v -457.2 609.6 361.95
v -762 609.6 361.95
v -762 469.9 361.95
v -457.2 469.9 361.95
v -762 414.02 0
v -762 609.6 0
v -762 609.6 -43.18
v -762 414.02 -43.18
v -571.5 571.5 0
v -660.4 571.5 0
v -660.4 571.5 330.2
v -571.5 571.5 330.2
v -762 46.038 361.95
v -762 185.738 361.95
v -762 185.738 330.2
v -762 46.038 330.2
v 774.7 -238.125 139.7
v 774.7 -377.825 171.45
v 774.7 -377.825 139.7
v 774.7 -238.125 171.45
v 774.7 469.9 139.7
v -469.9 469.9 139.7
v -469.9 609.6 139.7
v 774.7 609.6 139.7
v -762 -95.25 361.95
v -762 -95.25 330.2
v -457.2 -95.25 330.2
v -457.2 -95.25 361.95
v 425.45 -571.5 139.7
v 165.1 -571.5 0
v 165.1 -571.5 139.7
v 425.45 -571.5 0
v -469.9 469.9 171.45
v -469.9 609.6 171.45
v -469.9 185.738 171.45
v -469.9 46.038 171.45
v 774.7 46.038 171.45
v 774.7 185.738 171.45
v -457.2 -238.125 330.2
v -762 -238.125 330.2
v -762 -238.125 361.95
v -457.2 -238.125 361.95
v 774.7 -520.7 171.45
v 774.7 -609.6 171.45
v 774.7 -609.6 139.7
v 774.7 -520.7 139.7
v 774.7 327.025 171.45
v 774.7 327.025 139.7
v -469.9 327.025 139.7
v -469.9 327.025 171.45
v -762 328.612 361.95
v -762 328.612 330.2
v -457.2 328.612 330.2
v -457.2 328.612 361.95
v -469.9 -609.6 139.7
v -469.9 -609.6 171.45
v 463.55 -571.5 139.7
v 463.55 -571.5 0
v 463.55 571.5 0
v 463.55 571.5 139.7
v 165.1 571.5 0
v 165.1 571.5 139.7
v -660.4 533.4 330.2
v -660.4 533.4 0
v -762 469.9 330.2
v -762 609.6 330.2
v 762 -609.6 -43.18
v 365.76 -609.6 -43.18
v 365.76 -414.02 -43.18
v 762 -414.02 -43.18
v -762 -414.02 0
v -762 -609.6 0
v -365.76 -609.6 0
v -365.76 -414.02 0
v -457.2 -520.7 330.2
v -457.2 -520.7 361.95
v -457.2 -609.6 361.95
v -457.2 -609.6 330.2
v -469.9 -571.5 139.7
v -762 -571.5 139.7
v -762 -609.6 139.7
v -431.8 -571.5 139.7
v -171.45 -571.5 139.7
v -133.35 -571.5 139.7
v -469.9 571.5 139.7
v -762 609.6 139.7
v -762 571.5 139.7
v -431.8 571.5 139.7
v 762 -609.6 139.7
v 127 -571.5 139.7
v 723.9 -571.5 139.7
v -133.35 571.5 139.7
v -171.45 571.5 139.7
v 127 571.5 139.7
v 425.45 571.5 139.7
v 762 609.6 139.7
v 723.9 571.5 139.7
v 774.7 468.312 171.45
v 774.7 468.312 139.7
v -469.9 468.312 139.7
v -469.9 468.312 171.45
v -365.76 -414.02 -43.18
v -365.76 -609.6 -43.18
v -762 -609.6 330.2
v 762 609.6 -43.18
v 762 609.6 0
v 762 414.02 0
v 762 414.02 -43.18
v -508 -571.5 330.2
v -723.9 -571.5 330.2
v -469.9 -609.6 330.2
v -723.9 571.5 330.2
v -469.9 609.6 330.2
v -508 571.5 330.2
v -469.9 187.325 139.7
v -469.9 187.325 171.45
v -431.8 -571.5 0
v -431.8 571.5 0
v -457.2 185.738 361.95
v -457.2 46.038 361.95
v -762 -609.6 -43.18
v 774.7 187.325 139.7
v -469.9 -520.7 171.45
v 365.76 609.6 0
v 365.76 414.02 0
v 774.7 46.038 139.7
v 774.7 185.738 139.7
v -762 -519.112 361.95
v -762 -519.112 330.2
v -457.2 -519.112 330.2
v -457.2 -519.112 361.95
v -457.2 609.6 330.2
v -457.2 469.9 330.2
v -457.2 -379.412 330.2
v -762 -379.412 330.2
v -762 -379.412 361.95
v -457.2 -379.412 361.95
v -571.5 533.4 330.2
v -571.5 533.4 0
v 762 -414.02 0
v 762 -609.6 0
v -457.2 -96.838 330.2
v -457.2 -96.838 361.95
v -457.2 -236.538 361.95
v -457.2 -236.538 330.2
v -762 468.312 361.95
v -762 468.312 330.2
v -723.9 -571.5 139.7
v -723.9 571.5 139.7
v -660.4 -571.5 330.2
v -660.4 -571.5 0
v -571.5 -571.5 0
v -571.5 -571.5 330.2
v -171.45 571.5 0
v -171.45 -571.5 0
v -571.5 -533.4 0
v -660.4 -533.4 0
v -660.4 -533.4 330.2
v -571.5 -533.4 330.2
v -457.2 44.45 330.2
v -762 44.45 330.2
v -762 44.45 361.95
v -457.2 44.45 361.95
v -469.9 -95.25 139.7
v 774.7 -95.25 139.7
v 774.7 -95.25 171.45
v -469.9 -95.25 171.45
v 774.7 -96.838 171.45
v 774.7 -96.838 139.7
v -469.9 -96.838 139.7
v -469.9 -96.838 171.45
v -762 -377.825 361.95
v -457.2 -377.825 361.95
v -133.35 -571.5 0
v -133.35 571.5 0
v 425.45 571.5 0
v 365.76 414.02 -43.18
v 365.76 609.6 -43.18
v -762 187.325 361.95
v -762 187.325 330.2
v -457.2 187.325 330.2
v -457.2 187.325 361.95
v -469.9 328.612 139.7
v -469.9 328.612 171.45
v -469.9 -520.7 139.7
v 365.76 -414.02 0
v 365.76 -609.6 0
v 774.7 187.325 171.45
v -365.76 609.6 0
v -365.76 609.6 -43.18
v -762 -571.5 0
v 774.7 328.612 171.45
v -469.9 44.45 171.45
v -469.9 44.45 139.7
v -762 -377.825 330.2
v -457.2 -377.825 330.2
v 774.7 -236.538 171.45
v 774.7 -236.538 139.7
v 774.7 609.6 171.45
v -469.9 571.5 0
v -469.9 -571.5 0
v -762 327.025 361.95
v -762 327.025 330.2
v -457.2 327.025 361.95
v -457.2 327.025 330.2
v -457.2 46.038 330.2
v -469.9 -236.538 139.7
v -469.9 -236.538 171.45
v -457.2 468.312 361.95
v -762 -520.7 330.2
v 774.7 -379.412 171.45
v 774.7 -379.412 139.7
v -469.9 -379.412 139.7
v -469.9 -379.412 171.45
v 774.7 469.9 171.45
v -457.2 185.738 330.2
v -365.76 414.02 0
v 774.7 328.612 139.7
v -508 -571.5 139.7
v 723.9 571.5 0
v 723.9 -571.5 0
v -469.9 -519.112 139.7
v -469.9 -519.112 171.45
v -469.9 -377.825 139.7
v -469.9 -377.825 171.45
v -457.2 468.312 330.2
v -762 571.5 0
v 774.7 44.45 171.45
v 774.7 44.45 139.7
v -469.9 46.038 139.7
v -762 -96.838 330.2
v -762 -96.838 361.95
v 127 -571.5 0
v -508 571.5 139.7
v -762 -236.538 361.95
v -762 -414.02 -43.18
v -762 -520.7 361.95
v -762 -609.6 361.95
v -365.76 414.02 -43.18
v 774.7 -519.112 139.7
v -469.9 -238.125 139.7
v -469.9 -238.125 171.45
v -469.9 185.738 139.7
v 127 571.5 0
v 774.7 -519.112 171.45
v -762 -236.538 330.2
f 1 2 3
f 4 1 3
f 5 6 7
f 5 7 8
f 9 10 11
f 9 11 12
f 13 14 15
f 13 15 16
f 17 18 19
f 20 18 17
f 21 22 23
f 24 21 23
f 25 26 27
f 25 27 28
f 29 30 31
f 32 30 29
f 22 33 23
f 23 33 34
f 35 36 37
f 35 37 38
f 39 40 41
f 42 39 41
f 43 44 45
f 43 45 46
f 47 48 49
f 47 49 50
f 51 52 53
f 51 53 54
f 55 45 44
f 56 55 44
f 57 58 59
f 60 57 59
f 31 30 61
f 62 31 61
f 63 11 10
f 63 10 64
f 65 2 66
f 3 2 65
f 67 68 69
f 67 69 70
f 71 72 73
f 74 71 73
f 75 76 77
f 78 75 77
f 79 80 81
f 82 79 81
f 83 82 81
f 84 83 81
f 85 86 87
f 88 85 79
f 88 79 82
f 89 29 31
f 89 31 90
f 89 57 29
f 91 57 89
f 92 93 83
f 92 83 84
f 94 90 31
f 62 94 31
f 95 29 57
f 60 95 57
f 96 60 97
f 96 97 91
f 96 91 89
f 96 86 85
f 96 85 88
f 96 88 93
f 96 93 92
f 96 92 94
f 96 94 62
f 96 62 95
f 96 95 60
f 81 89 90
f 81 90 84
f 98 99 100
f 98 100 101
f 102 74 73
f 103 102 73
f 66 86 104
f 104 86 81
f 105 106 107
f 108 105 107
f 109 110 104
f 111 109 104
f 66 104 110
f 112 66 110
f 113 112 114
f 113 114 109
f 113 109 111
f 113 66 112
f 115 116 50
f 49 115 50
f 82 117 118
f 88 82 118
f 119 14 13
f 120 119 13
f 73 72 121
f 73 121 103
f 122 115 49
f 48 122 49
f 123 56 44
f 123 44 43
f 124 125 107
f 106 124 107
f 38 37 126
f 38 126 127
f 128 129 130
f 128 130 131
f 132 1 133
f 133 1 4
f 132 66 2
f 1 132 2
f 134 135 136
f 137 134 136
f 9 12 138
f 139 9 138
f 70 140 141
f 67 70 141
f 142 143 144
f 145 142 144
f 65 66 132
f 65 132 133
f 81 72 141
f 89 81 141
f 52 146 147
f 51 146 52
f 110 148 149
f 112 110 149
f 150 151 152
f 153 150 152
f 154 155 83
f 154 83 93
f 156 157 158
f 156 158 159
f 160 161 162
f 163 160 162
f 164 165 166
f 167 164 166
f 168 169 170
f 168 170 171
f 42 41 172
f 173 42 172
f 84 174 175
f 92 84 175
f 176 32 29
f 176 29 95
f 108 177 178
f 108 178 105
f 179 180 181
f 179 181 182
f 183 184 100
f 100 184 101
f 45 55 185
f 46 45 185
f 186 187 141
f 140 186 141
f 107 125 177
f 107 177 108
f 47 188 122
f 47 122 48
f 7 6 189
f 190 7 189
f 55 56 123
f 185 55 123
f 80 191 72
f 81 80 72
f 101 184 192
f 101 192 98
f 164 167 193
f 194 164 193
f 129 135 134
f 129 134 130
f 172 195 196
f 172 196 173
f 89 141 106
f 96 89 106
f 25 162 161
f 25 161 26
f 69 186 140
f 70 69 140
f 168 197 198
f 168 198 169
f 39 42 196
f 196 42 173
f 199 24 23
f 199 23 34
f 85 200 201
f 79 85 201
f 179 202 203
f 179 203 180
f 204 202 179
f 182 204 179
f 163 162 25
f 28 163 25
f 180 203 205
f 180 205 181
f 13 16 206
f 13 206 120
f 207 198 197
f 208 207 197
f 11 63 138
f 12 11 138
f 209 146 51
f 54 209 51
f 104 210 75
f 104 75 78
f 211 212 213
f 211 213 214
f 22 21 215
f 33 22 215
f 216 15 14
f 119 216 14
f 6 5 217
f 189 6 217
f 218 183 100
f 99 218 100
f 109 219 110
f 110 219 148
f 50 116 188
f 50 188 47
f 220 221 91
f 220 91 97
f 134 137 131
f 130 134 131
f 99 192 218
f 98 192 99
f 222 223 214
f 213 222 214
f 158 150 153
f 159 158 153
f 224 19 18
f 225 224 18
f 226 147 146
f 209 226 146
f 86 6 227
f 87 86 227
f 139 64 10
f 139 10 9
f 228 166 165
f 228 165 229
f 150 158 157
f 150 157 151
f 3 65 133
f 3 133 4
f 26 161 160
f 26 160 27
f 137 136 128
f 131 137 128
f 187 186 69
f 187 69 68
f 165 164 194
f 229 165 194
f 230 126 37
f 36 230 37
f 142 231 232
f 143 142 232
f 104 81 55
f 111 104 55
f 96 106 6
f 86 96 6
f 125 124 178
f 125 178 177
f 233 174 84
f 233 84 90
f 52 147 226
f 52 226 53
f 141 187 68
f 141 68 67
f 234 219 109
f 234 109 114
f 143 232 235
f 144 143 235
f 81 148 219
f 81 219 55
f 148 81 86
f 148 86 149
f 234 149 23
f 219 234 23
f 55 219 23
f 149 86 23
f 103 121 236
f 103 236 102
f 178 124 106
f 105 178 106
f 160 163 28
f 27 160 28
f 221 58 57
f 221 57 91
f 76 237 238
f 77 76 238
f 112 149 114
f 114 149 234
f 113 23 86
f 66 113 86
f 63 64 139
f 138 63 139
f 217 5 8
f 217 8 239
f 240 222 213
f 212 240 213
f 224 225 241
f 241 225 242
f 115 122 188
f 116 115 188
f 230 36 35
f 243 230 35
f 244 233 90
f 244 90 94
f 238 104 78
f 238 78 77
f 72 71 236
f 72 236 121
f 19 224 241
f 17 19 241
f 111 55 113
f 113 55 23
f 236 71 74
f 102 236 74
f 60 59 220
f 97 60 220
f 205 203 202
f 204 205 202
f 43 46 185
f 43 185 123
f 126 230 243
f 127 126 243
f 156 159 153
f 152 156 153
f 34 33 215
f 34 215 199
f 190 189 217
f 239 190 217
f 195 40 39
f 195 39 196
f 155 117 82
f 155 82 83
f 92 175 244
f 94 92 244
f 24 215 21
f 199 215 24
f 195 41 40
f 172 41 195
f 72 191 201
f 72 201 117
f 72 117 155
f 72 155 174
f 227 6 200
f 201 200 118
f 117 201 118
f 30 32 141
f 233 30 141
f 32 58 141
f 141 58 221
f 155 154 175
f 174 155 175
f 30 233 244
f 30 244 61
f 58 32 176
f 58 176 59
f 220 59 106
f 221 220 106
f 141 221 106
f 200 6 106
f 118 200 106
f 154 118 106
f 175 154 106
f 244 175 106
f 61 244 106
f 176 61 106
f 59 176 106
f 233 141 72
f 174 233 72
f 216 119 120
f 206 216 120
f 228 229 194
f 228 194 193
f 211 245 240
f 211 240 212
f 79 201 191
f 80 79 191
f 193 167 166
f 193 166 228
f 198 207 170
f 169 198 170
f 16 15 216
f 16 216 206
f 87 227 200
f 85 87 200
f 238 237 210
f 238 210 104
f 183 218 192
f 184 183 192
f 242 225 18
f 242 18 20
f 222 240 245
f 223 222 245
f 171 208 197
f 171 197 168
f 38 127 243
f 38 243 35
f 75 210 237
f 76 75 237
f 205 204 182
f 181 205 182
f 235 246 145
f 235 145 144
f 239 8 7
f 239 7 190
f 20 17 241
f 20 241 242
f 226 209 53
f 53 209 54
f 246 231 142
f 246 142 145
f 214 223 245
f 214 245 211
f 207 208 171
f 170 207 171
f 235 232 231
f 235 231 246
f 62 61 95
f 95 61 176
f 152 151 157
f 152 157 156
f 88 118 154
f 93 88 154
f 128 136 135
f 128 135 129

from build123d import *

# Parameters (mm, degrees)
F0_W      = 260.35
F0_H      = 1143
F1_DEPTH  = 139.7
F2_W      = 38.1
F2_H      = 1143
F3_DEPTH  = 190.5
F4_W      = 139.7
F4_H      = 31.75
F5_DEPTH  = 304.8
F4_W_2    = 88.9
F6_W      = 88.9
F6_H      = 31.75
F7_DEPTH  = 1244.6
F6_W_2    = 139.7
F8_W      = 88.9
F8_H      = 38.1
F9_DEPTH  = 330.2
F10_W     = 396.24
F10_H     = 195.58
F11_DEPTH = 43.18


with BuildPart() as f1:
    # F0 (on Top) → F1 (new body)
    with BuildSketch(Plane.XY):
        Polygon((762, 609.6), (-762, 609.6), (-762, 571.5), (-469.9, 571.5), (-469.9, -571.5), (-762, -571.5), (-762, -609.6), (762, -609.6), align=None)
        with Locations((-301.625, 0)):
            Rectangle(F0_W, F0_H, mode=Mode.SUBTRACT)
        with Locations((-3.175, 0)):
            Rectangle(F0_W, F0_H, mode=Mode.SUBTRACT)
        with Locations((295.275, 0)):
            Rectangle(F0_W, F0_H, mode=Mode.SUBTRACT)
        with Locations((593.725, 0)):
            Rectangle(F0_W, F0_H, mode=Mode.SUBTRACT)
    extrude(amount=F1_DEPTH)


with BuildPart() as f3:
    # F2 (on face) → F3 (new body)
    with BuildSketch(Plane.XY.offset(139.7)):
        Polygon((-762, -571.5), (-762, -609.6), (-469.9, -609.6), (-469.9, -571.5), (-508, -571.5), (-723.9, -571.5), align=None)
        with Locations((-488.95, 0)):
            Rectangle(F2_W, F2_H)
        Polygon((-762, 609.6), (-762, 571.5), (-723.9, 571.5), (-508, 571.5), (-469.9, 571.5), (-469.9, 609.6), align=None)
        with Locations((-742.95, 0)):
            Rectangle(F2_W, F2_H)
    extrude(amount=F3_DEPTH)


with BuildPart() as f5:
    # F4 (on face) → F5 (new body)
    with BuildSketch(Plane(origin=(-762, 0, 0), x_dir=(0, -1, 0), z_dir=(-1, 0, 0))):
        with Locations((-539.75, 346.075)):
            Rectangle(F4_W, F4_H)
    extrude(amount=-F5_DEPTH)


with BuildPart() as f5b:
    # F4 (on face) → F5, piece 2 (new body)
    with BuildSketch(Plane(origin=(-762, 0, 0), x_dir=(0, -1, 0), z_dir=(-1, 0, 0))):
        with Locations((-398.4625, 346.075)):
            Rectangle(F4_W, F4_H)
    extrude(amount=-F5_DEPTH)


with BuildPart() as f5c:
    # F4 (on face) → F5, piece 3 (new body)
    with BuildSketch(Plane(origin=(-762, 0, 0), x_dir=(0, -1, 0), z_dir=(-1, 0, 0))):
        with Locations((-257.175, 346.075)):
            Rectangle(F4_W, F4_H)
    extrude(amount=-F5_DEPTH)


with BuildPart() as f5d:
    # F4 (on face) → F5, piece 4 (new body)
    with BuildSketch(Plane(origin=(-762, 0, 0), x_dir=(0, -1, 0), z_dir=(-1, 0, 0))):
        with Locations((-115.8875, 346.075)):
            Rectangle(F4_W, F4_H)
    extrude(amount=-F5_DEPTH)


with BuildPart() as f5e:
    # F4 (on face) → F5, piece 5 (new body)
    with BuildSketch(Plane(origin=(-762, 0, 0), x_dir=(0, -1, 0), z_dir=(-1, 0, 0))):
        with Locations((25.4, 346.075)):
            Rectangle(F4_W, F4_H)
    extrude(amount=-F5_DEPTH)


with BuildPart() as f5f:
    # F4 (on face) → F5, piece 6 (new body)
    with BuildSketch(Plane(origin=(-762, 0, 0), x_dir=(0, -1, 0), z_dir=(-1, 0, 0))):
        with Locations((166.6875, 346.075)):
            Rectangle(F4_W, F4_H)
    extrude(amount=-F5_DEPTH)


with BuildPart() as f5g:
    # F4 (on face) → F5, piece 7 (new body)
    with BuildSketch(Plane(origin=(-762, 0, 0), x_dir=(0, -1, 0), z_dir=(-1, 0, 0))):
        with Locations((307.975, 346.075)):
            Rectangle(F4_W, F4_H)
    extrude(amount=-F5_DEPTH)


with BuildPart() as f5h:
    # F4 (on face) → F5, piece 8 (new body)
    with BuildSketch(Plane(origin=(-762, 0, 0), x_dir=(0, -1, 0), z_dir=(-1, 0, 0))):
        with Locations((449.2625, 346.075)):
            Rectangle(F4_W, F4_H)
    extrude(amount=-F5_DEPTH)


with BuildPart() as f5i:
    # F4 (on face) → F5, piece 9 (new body)
    with BuildSketch(Plane(origin=(-762, 0, 0), x_dir=(0, -1, 0), z_dir=(-1, 0, 0))):
        with Locations((565.15, 346.075)):
            Rectangle(F4_W_2, F4_H)
    extrude(amount=-F5_DEPTH)


with BuildPart() as f7:
    # F6 (on face) → F7 (new body)
    with BuildSketch(Plane.YZ.offset(-469.9)):
        with Locations((-565.15, 155.575)):
            Rectangle(F6_W, F6_H)
    extrude(amount=F7_DEPTH)


with BuildPart() as f7b:
    # F6 (on face) → F7, piece 2 (new body)
    with BuildSketch(Plane.YZ.offset(-469.9)):
        with Locations((-449.2625, 155.575)):
            Rectangle(F6_W_2, F6_H)
    extrude(amount=F7_DEPTH)


with BuildPart() as f7c:
    # F6 (on face) → F7, piece 3 (new body)
    with BuildSketch(Plane.YZ.offset(-469.9)):
        with Locations((-307.975, 155.575)):
            Rectangle(F6_W_2, F6_H)
    extrude(amount=F7_DEPTH)


with BuildPart() as f7d:
    # F6 (on face) → F7, piece 4 (new body)
    with BuildSketch(Plane.YZ.offset(-469.9)):
        with Locations((-166.6875, 155.575)):
            Rectangle(F6_W_2, F6_H)
    extrude(amount=F7_DEPTH)


with BuildPart() as f7e:
    # F6 (on face) → F7, piece 5 (new body)
    with BuildSketch(Plane.YZ.offset(-469.9)):
        with Locations((-25.4, 155.575)):
            Rectangle(F6_W_2, F6_H)
    extrude(amount=F7_DEPTH)


with BuildPart() as f7f:
    # F6 (on face) → F7, piece 6 (new body)
    with BuildSketch(Plane.YZ.offset(-469.9)):
        with Locations((115.8875, 155.575)):
            Rectangle(F6_W_2, F6_H)
    extrude(amount=F7_DEPTH)


with BuildPart() as f7g:
    # F6 (on face) → F7, piece 7 (new body)
    with BuildSketch(Plane.YZ.offset(-469.9)):
        with Locations((257.175, 155.575)):
            Rectangle(F6_W_2, F6_H)
    extrude(amount=F7_DEPTH)


with BuildPart() as f7h:
    # F6 (on face) → F7, piece 8 (new body)
    with BuildSketch(Plane.YZ.offset(-469.9)):
        with Locations((398.4625, 155.575)):
            Rectangle(F6_W_2, F6_H)
    extrude(amount=F7_DEPTH)


with BuildPart() as f7i:
    # F6 (on face) → F7, piece 9 (new body)
    with BuildSketch(Plane.YZ.offset(-469.9)):
        with Locations((539.75, 155.575)):
            Rectangle(F6_W_2, F6_H)
    extrude(amount=F7_DEPTH)


with BuildPart() as f9:
    # F8 (on face) → F9 (new body, through all)
    with BuildSketch(Plane(origin=(0, 0, 0), x_dir=(1, 0, 0), z_dir=(0, 0, -1))):
        with Locations((-615.95, 552.45)):
            Rectangle(F8_W, F8_H)
    extrude(amount=-F9_DEPTH)


with BuildPart() as f9b:
    # F8 (on face) → F9, piece 2 (new body, through all)
    with BuildSketch(Plane(origin=(0, 0, 0), x_dir=(1, 0, 0), z_dir=(0, 0, -1))):
        with Locations((-615.95, -552.45)):
            Rectangle(F8_W, F8_H)
    extrude(amount=-F9_DEPTH)


with BuildPart() as f11:
    # F10 (on face) → F11 (new body)
    with BuildSketch(Plane(origin=(0, 0, 0), x_dir=(1, 0, 0), z_dir=(0, 0, -1))):
        with Locations((-563.88, 511.81)):
            Rectangle(F10_W, F10_H)
    extrude(amount=F11_DEPTH)


with BuildPart() as f11b:
    # F10 (on face) → F11, piece 2 (new body)
    with BuildSketch(Plane(origin=(0, 0, 0), x_dir=(1, 0, 0), z_dir=(0, 0, -1))):
        with Locations((563.88, 511.81)):
            Rectangle(F10_W, F10_H)
    extrude(amount=F11_DEPTH)


with BuildPart() as f11c:
    # F10 (on face) → F11, piece 3 (new body)
    with BuildSketch(Plane(origin=(0, 0, 0), x_dir=(1, 0, 0), z_dir=(0, 0, -1))):
        with Locations((-563.88, -511.81)):
            Rectangle(F10_W, F10_H)
    extrude(amount=F11_DEPTH)


with BuildPart() as f11d:
    # F10 (on face) → F11, piece 4 (new body)
    with BuildSketch(Plane(origin=(0, 0, 0), x_dir=(1, 0, 0), z_dir=(0, 0, -1))):
        with Locations((563.88, -511.81)):
            Rectangle(F10_W, F10_H)
    extrude(amount=F11_DEPTH)


solid = Compound([f1.part, f3.part, f5.part, f5b.part, f5c.part, f5d.part, f5e.part, f5f.part, f5g.part, f5h.part, f5i.part, f7.part, f7b.part, f7c.part, f7d.part, f7e.part, f7f.part, f7g.part, f7h.part, f7i.part, f9.part, f9b.part, f11.part, f11b.part, f11c.part, f11d.part])
